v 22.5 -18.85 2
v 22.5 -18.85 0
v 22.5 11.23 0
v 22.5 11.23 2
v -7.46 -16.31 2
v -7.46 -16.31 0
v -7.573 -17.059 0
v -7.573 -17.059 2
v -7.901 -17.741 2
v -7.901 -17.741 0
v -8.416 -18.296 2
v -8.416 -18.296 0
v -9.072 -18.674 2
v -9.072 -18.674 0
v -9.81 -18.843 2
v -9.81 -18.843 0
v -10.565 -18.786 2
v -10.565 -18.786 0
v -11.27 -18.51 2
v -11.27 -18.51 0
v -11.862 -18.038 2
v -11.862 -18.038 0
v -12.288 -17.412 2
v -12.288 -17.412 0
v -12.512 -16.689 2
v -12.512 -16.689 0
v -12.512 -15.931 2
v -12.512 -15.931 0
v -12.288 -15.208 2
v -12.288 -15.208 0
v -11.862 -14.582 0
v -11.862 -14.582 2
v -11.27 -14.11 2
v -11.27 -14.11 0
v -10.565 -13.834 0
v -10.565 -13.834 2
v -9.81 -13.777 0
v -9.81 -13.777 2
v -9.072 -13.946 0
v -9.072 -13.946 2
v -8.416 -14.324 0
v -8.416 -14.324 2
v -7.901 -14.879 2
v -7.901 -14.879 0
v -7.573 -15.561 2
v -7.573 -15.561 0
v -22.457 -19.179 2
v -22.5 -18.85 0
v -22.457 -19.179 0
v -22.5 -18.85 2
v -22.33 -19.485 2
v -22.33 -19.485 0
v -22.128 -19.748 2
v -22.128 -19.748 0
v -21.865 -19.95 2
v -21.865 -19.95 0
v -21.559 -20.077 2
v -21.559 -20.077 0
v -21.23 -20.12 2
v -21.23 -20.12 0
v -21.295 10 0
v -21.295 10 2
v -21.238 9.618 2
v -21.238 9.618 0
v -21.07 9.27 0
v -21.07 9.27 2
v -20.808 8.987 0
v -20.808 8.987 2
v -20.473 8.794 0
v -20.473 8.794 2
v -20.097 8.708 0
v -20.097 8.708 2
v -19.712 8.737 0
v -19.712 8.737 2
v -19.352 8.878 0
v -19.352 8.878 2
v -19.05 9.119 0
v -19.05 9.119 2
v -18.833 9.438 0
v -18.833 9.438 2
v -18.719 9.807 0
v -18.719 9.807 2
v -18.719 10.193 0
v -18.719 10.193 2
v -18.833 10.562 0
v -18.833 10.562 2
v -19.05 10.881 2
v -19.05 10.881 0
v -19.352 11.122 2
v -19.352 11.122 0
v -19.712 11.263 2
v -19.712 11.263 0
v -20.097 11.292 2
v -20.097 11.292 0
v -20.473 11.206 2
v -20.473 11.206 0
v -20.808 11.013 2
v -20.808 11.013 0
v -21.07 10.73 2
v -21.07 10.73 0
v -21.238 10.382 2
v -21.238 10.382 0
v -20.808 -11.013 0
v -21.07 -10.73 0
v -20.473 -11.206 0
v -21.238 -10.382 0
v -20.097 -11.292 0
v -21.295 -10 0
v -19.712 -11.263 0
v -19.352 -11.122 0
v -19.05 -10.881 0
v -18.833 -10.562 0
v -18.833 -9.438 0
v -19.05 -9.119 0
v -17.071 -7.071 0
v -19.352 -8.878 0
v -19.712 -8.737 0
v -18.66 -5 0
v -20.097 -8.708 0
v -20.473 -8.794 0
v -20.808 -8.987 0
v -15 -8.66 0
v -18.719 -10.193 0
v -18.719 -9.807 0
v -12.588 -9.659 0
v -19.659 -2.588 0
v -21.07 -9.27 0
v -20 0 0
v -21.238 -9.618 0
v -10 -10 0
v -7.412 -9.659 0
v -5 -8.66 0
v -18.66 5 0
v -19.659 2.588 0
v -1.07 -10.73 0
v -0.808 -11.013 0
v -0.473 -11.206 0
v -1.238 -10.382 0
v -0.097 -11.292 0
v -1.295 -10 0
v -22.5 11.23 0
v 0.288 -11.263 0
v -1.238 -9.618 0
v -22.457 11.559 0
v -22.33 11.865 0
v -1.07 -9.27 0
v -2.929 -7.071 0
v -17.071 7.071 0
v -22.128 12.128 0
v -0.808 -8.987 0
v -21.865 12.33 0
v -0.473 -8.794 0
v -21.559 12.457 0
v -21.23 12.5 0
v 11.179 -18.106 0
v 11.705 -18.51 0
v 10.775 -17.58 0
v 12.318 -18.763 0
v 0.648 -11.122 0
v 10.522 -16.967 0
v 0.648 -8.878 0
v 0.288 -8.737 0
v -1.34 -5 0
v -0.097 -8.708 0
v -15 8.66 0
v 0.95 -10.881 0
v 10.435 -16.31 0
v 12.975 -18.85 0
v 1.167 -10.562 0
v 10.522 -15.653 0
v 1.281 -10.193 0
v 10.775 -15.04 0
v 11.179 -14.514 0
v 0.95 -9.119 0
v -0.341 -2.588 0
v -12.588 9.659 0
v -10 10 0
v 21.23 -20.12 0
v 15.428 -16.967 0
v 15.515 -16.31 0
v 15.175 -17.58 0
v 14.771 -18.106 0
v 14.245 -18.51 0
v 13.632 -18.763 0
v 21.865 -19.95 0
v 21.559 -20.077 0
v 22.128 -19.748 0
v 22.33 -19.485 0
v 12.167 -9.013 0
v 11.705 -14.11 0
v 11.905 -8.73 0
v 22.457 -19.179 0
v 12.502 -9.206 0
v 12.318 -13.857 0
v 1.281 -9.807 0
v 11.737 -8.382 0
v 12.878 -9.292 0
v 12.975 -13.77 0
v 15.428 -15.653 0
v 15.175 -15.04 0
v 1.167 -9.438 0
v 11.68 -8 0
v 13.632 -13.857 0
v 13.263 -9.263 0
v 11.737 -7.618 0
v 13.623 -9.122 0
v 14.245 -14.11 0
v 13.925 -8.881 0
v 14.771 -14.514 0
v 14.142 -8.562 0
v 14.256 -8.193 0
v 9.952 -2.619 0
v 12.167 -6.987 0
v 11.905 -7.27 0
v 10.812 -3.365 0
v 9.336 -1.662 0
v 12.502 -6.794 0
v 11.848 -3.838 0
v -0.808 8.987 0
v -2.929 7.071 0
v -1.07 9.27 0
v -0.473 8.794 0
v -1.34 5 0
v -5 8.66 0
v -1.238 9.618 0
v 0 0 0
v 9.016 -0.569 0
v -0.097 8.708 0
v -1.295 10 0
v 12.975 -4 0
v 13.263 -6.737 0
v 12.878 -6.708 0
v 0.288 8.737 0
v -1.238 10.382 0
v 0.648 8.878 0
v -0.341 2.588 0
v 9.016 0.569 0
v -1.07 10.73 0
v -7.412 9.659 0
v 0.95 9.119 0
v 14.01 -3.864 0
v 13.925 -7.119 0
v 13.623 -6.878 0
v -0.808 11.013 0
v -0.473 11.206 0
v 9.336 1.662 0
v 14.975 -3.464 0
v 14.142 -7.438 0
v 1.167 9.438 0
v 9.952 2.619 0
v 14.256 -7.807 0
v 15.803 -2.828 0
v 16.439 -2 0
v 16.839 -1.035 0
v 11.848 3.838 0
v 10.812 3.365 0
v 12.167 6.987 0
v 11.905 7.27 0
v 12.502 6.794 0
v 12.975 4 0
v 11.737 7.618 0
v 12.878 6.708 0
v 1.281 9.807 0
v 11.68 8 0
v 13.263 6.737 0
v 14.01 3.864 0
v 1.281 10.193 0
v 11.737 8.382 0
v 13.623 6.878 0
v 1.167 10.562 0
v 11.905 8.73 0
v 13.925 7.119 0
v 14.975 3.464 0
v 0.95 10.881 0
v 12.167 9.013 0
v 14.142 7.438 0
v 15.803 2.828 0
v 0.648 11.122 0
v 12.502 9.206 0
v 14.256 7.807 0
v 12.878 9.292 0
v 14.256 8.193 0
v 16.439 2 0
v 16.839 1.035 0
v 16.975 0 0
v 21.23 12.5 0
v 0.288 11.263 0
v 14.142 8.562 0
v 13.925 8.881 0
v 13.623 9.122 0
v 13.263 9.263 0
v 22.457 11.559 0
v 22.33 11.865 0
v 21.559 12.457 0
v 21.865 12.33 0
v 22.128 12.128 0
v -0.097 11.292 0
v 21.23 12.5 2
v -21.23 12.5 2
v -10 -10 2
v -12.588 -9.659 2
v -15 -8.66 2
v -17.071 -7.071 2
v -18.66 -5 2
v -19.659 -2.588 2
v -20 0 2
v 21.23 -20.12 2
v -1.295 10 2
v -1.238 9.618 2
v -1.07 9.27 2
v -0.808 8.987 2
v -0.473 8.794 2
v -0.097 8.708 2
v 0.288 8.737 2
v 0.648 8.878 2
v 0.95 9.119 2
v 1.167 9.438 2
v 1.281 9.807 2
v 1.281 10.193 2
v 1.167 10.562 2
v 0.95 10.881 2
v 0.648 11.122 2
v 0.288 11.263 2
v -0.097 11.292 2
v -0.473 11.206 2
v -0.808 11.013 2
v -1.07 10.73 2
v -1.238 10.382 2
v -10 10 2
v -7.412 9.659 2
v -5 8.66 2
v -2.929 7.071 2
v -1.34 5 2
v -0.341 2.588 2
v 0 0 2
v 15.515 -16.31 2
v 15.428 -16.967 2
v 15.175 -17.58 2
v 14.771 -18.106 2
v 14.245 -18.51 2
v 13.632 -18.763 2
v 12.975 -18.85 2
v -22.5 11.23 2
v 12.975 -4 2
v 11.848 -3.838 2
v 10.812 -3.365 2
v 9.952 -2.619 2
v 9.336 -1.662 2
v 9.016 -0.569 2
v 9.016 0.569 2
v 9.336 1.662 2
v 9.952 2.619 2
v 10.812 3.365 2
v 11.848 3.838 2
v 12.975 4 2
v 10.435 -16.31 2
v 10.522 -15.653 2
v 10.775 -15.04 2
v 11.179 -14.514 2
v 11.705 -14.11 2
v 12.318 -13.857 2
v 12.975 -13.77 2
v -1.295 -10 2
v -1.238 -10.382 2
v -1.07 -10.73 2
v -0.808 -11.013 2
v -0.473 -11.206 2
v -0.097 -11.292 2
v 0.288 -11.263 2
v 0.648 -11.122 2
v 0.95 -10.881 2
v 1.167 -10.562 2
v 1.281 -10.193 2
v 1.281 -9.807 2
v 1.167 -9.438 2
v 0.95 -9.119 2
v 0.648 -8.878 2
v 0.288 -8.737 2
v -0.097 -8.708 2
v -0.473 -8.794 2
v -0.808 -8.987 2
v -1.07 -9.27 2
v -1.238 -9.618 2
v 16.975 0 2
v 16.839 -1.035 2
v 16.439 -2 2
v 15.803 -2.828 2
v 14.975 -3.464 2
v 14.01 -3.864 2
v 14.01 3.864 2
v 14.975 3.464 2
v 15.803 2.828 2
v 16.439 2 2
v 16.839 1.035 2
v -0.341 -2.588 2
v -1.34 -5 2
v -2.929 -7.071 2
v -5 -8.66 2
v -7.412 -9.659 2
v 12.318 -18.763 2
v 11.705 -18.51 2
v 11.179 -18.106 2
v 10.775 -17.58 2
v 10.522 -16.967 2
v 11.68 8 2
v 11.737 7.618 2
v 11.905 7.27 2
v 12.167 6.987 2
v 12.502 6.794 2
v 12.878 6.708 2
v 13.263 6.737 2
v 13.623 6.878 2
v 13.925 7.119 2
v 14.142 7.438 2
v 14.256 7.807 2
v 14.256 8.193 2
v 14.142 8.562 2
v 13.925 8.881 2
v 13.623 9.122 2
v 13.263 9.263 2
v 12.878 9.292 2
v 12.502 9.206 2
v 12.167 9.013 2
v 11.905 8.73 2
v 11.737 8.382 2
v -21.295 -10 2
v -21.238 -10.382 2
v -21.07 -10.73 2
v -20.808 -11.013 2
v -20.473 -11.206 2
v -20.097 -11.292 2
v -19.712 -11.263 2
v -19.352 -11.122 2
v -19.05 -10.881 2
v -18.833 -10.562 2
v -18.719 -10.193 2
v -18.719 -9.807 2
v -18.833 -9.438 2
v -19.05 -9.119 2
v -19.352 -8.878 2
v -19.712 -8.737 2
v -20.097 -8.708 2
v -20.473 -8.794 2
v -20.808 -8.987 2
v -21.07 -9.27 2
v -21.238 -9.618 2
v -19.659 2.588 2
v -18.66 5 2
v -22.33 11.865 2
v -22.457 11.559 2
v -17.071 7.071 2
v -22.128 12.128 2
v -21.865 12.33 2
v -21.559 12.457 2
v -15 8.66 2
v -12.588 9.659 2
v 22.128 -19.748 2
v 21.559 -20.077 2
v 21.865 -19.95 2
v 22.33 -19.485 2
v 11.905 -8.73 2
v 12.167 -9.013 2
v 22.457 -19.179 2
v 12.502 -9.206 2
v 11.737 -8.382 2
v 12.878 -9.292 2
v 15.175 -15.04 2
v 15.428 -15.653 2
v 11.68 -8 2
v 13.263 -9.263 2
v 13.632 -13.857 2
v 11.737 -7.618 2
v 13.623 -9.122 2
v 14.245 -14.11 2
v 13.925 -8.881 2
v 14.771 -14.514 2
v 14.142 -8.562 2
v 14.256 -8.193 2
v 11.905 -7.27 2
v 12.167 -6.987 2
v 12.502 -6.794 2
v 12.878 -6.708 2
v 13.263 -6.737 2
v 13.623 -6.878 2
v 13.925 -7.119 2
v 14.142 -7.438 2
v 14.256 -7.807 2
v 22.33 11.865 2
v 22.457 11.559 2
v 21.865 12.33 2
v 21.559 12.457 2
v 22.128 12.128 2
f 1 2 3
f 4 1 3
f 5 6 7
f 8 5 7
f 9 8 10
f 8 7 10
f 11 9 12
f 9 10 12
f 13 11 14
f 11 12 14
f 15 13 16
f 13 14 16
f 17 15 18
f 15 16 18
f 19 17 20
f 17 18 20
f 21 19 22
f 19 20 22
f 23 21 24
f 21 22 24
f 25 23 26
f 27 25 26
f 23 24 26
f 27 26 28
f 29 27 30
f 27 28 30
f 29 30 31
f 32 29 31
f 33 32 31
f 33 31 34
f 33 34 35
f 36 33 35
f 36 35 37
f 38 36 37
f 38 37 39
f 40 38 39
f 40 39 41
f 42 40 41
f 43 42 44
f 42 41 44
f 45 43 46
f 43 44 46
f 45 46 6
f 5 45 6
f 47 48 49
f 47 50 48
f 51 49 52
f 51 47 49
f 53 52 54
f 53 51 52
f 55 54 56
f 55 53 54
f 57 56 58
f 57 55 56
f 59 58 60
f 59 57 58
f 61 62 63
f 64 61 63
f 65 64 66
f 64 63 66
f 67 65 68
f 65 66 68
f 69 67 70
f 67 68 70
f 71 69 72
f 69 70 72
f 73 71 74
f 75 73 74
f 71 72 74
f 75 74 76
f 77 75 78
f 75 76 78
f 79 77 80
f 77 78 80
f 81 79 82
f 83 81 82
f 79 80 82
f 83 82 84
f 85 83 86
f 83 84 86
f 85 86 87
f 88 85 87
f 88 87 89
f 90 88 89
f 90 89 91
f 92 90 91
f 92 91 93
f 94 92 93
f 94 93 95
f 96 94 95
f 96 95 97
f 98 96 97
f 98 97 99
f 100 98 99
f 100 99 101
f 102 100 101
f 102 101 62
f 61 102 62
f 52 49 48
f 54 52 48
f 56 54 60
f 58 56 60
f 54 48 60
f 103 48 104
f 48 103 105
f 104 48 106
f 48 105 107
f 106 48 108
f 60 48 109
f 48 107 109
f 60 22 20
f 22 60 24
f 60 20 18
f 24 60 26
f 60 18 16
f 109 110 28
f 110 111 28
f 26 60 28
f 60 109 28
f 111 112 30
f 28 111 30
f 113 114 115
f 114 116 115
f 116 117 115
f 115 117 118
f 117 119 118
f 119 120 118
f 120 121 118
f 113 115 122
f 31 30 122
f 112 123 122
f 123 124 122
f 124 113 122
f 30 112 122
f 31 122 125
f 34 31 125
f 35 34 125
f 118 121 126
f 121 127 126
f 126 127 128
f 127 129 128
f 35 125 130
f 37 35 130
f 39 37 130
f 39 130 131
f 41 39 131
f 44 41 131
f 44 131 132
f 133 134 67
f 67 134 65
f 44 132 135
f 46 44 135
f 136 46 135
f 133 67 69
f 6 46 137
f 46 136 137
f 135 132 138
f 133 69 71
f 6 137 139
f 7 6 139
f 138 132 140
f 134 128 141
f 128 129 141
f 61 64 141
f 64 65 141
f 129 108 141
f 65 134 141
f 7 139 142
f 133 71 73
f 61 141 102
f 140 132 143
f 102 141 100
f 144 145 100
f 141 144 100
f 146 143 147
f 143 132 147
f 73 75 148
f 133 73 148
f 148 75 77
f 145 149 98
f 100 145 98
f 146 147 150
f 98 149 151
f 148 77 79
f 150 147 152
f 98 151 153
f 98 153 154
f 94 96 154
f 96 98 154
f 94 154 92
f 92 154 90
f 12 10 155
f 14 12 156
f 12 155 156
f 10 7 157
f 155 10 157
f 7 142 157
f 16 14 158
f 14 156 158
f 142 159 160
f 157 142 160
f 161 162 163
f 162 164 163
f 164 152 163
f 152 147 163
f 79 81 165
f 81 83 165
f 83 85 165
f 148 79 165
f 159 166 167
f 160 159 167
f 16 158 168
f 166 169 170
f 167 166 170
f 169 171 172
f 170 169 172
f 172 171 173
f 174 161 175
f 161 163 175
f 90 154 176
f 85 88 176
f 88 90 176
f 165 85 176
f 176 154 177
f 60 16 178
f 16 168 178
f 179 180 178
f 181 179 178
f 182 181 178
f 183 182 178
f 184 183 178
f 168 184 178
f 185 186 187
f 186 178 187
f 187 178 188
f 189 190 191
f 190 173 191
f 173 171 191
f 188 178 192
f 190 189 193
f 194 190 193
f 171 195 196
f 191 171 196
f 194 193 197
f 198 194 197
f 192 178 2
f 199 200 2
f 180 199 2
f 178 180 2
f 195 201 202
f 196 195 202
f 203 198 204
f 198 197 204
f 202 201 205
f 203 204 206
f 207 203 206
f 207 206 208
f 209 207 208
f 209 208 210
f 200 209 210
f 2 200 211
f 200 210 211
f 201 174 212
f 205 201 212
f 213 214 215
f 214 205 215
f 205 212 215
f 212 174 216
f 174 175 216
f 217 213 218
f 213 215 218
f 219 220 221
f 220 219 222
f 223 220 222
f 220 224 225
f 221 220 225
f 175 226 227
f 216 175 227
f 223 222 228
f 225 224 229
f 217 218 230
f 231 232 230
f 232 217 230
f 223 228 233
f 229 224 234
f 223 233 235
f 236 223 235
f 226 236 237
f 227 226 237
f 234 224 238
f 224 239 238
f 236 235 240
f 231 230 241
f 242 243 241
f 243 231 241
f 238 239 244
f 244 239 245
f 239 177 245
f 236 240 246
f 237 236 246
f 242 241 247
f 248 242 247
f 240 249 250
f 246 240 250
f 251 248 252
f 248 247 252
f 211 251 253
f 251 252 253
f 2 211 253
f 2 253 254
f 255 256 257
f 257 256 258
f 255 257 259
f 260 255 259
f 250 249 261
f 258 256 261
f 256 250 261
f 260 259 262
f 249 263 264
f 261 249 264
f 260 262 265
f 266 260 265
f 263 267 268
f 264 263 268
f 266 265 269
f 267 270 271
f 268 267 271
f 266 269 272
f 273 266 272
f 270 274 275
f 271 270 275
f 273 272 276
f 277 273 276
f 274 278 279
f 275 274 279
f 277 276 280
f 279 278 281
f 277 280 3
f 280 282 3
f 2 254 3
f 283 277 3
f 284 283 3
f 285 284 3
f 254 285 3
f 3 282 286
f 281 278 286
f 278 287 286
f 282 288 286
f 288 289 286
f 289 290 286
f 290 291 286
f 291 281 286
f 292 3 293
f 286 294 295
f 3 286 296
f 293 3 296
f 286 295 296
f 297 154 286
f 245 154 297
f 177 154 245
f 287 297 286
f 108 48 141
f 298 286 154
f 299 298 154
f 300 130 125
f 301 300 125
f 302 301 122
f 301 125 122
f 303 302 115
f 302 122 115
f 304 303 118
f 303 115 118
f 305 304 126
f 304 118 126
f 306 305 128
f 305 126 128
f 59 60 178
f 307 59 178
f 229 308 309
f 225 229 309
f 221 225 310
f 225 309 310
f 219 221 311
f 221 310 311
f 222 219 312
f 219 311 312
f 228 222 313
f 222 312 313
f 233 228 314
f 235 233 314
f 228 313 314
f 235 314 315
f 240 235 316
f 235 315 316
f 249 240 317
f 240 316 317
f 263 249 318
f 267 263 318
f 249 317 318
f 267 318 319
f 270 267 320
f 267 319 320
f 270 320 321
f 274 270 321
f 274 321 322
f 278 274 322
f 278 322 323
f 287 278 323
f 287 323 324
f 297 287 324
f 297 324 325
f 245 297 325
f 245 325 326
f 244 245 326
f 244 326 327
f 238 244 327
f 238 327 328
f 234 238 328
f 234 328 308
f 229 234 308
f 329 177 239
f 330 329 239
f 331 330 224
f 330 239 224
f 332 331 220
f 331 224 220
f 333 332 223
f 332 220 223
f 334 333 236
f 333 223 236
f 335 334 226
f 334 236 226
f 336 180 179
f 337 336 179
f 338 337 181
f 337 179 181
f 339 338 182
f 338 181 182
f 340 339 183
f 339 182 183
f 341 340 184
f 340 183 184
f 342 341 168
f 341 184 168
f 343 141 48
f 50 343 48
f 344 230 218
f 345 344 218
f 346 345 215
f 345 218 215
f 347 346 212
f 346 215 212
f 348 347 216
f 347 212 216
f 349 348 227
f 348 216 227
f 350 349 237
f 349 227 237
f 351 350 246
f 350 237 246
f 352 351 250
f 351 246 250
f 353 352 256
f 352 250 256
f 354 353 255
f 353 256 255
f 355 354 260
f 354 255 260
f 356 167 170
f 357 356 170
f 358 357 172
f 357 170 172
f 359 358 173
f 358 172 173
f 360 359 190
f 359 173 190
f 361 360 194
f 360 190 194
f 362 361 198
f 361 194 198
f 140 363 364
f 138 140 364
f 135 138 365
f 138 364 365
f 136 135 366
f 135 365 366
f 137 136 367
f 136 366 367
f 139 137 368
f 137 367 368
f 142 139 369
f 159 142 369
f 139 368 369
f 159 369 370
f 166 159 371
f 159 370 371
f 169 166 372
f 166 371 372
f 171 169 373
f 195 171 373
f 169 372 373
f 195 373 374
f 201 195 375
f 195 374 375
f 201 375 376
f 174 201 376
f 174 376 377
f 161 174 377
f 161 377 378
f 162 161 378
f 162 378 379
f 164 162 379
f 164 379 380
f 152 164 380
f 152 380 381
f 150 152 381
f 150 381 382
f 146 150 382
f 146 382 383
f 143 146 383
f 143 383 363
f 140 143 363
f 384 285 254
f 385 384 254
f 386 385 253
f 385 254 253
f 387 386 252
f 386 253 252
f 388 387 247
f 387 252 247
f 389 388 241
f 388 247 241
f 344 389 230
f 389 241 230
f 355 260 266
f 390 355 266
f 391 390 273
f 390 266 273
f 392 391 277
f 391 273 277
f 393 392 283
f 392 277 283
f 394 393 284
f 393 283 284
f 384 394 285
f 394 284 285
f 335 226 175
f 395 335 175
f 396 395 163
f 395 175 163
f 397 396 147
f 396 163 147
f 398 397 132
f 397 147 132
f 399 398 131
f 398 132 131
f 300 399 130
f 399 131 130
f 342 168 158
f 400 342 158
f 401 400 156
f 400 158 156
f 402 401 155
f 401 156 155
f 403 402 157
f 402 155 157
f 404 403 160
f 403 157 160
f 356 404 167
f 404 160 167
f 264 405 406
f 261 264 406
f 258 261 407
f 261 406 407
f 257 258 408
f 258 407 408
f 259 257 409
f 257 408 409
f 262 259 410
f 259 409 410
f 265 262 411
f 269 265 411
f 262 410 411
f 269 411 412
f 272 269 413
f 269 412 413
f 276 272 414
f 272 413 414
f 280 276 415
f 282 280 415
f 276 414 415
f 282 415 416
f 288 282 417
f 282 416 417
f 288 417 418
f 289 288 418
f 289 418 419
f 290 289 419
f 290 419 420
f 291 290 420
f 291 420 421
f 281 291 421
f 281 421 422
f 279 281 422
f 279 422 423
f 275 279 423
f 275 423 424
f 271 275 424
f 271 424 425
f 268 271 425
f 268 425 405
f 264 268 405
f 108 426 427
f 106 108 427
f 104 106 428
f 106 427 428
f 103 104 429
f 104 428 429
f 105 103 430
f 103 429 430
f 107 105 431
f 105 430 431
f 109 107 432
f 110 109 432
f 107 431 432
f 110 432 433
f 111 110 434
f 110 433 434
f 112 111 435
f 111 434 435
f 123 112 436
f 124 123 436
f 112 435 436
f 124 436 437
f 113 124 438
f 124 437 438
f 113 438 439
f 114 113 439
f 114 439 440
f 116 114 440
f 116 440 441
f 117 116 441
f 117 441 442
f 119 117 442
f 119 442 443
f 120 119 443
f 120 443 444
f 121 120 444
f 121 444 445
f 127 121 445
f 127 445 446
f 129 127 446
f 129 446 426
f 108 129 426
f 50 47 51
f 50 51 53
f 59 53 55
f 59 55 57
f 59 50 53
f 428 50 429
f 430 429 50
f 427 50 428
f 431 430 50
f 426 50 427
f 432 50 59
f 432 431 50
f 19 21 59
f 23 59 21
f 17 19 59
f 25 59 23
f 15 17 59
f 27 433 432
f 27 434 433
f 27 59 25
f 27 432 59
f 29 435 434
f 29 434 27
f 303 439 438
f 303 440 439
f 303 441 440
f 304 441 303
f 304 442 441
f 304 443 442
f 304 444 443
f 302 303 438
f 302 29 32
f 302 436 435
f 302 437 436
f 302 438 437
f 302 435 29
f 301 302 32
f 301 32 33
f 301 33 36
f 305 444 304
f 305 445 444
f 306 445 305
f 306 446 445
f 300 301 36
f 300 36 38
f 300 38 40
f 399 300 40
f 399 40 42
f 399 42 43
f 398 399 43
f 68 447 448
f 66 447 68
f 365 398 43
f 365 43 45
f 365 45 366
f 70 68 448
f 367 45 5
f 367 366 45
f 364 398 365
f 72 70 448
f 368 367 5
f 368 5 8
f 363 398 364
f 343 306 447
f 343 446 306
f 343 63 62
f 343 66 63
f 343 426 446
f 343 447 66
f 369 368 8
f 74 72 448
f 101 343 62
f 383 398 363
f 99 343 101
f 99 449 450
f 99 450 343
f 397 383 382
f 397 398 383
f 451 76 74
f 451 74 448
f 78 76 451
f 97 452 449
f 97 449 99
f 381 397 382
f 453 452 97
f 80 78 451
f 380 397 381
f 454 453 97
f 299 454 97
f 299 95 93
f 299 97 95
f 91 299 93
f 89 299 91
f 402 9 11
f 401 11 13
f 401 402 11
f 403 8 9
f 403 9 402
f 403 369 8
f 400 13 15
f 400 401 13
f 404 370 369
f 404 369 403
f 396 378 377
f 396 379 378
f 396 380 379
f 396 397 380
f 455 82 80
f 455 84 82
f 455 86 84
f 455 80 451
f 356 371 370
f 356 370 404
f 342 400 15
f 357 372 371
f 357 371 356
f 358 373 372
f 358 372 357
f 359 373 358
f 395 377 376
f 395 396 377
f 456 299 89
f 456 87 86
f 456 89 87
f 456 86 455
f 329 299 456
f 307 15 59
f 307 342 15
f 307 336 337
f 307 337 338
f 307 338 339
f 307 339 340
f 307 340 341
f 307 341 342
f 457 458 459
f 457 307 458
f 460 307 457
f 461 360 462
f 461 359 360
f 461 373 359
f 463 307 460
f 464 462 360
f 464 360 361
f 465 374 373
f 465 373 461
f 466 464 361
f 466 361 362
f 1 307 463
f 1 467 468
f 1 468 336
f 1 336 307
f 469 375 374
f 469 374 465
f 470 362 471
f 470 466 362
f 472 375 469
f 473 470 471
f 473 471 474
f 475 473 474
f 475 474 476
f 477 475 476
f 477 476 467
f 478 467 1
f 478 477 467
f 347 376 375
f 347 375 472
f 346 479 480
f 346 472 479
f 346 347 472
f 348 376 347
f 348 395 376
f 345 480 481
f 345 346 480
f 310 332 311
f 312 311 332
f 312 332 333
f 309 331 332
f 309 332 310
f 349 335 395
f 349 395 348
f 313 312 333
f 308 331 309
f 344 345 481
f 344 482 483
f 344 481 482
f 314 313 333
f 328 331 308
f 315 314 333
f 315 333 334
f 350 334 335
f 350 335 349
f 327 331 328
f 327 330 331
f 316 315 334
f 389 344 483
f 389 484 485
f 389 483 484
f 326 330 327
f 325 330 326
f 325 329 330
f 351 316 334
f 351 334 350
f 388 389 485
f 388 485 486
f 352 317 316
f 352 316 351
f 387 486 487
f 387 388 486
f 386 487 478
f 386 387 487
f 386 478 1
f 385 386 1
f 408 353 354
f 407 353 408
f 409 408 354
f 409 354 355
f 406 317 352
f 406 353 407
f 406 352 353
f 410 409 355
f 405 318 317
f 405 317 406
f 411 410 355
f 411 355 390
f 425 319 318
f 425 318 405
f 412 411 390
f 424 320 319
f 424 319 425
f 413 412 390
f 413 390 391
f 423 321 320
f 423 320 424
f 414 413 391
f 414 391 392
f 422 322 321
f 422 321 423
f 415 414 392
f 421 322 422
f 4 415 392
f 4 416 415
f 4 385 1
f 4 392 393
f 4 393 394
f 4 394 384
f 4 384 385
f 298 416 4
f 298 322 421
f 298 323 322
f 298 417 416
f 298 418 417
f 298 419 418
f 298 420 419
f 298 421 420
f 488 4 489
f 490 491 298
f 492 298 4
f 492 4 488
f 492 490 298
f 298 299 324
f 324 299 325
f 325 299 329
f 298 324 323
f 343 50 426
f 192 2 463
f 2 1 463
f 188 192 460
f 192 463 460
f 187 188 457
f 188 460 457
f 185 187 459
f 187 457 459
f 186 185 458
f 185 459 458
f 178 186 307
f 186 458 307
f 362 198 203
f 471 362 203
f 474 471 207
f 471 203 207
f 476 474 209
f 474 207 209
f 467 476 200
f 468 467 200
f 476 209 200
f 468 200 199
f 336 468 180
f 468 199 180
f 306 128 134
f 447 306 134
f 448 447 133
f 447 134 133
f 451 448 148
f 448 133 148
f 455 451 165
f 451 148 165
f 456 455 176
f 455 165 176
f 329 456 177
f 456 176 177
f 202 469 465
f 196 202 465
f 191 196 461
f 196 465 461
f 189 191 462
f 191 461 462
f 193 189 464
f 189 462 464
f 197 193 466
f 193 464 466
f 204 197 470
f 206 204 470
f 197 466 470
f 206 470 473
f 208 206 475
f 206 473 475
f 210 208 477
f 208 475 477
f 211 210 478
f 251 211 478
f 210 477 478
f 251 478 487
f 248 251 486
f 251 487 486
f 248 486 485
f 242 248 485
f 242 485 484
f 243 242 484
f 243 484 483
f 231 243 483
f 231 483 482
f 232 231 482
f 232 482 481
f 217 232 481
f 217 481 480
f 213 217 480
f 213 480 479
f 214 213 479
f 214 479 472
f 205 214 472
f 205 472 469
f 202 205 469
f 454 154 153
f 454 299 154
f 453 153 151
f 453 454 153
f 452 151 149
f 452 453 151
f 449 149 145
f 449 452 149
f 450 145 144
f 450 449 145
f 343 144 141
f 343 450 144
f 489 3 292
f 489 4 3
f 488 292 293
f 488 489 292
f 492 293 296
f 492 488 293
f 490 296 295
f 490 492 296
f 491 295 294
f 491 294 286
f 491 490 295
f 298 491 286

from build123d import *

# Parameters (mm, degrees)
F1_DEPTH = 2
F2_R     = 1.27
F3_D     = 2.5908
F3_DEPTH = 3.81
F3_TIP   = 0.7783548459


with BuildPart() as f1:
    # F0 (on Top) → F1 (new body)
    with BuildSketch(Plane.XY):
        with BuildLine():
            Line((22.5, -20.12), (22.5, -12.5))
            Line((22.5, -12.5), (12.975, -12.5))
            Line((12.975, -12.5), (12.975, -13.77))
            ThreePointArc((12.975, -13.77), (14.7710512242, -14.5139487758), (15.515, -16.31))
            ThreePointArc((15.515, -16.31), (14.7710512242, -18.1060512242), (12.975, -18.85))
            Line((12.975, -18.85), (12.975, -20.12))
            Line((12.975, -20.12), (22.5, -20.12))
        make_face()
        with BuildLine():
            Line((12.975, -12.5), (22.5, -12.5))
            Line((22.5, -12.5), (22.5, 0))
            Line((22.5, 0), (20.975, 0))
            ThreePointArc((20.975, 0), (18.6318542495, -5.6568542495), (12.975, -8))
            Line((12.975, -8), (12.975, -12.5))
        make_face()
        with BuildLine():
            Line((12.975, -13.77), (12.975, -12.5))
            Line((12.975, -12.5), (-22.5, -12.5))
            Line((-22.5, -12.5), (-22.5, -16.31))
            Line((-22.5, -16.31), (-12.54, -16.31))
            ThreePointArc((-12.54, -16.31), (-10, -13.77), (-7.46, -16.31))
            Line((-7.46, -16.31), (10.435, -16.31))
            ThreePointArc((10.435, -16.31), (11.1789487758, -14.5139487758), (12.975, -13.77))
        make_face()
        with BuildLine():
            Line((-22.5, -12.5), (12.975, -12.5))
            Line((12.975, -12.5), (12.975, -8))
            ThreePointArc((12.975, -8), (4.975, 0), (12.975, 8))
            ThreePointArc((12.975, 8), (18.6318542495, 5.6568542495), (20.975, 0))
            Line((20.975, 0), (22.5, 0))
            Line((22.5, 0), (22.5, 12.5))
            Line((22.5, 12.5), (-22.5, 12.5))
            Line((-22.5, 12.5), (-22.5, 0))
            Line((-22.5, 0), (-22.5, -12.5))
        make_face()
        Polygon((-20, -10), (-20, 0), (-20, 10), (-10, 10), (0, 10), (0, 0), (0, -10), (-10, -10), align=None, mode=Mode.SUBTRACT)
        with BuildLine():
            Line((-22.5, -20.12), (12.975, -20.12))
            Line((12.975, -20.12), (12.975, -18.85))
            ThreePointArc((12.975, -18.85), (11.1789487758, -18.1060512242), (10.435, -16.31))
            Line((10.435, -16.31), (-7.46, -16.31))
            ThreePointArc((-7.46, -16.31), (-10, -18.85), (-12.54, -16.31))
            Line((-12.54, -16.31), (-22.5, -16.31))
            Line((-22.5, -16.31), (-22.5, -20.12))
        make_face()
        with BuildLine():
            ThreePointArc((12.975, 8), (4.975, 0), (12.975, -8))
            Line((12.975, -8), (12.975, -4))
            ThreePointArc((12.975, -4), (8.975, 0), (12.975, 4))
            Line((12.975, 4), (12.975, 8))
        make_face()
        with BuildLine():
            Line((16.975, 0), (20.975, 0))
            ThreePointArc((20.975, 0), (18.6318542495, 5.6568542495), (12.975, 8))
            Line((12.975, 8), (12.975, 4))
            ThreePointArc((12.975, 4), (15.8034271247, 2.8284271247), (16.975, 0))
        make_face()
        with BuildLine():
            Line((12.975, -4), (12.975, -8))
            ThreePointArc((12.975, -8), (18.6318542495, -5.6568542495), (20.975, 0))
            Line((20.975, 0), (16.975, 0))
            ThreePointArc((16.975, 0), (15.8034271247, -2.8284271247), (12.975, -4))
        make_face()
        with BuildLine():
            ThreePointArc((0, 0), (-2.9289321881, -7.0710678119), (-10, -10))
            Line((-10, -10), (0, -10))
            Line((0, -10), (0, 0))
        make_face()
        with BuildLine():
            ThreePointArc((-10, -10), (-17.0710678119, -7.0710678119), (-20, 0))
            Line((-20, 0), (-20, -10))
            Line((-20, -10), (-10, -10))
        make_face()
        with BuildLine():
            Line((-20, 10), (-20, 0))
            ThreePointArc((-20, 0), (-17.0710678119, 7.0710678119), (-10, 10))
            Line((-10, 10), (-20, 10))
        make_face()
        with BuildLine():
            Line((0, 10), (-10, 10))
            ThreePointArc((-10, 10), (-2.9289321881, 7.0710678119), (0, 0))
            Line((0, 0), (0, 10))
        make_face()
    extrude(amount=F1_DEPTH)

    # F2
    f2_edges = [f1.edges().sort_by_distance(p)[0] for p in [
        (-22.5, 12.5, 1),
        (22.5, 12.5, 1),
        (-22.5, -20.12, 1),
        (22.5, -20.12, 1),
    ]]
    fillet(f2_edges, radius=F2_R)

    # F3
    with Locations(Plane(origin=(0, 0, 0), x_dir=(1, 0, 0), z_dir=(0, 0, -1))):
        with Locations((-20, -10), (0, -10), (0, 10), (-20, 10), (12.975, -8), (12.975, 8)):
            Hole(F3_D / 2, depth=F3_DEPTH)
            with Locations((0, 0, -(F3_DEPTH + F3_TIP / 2))):  # 118° drill point
                Cone(0, F3_D / 2, F3_TIP, mode=Mode.SUBTRACT)


solid = f1.part
